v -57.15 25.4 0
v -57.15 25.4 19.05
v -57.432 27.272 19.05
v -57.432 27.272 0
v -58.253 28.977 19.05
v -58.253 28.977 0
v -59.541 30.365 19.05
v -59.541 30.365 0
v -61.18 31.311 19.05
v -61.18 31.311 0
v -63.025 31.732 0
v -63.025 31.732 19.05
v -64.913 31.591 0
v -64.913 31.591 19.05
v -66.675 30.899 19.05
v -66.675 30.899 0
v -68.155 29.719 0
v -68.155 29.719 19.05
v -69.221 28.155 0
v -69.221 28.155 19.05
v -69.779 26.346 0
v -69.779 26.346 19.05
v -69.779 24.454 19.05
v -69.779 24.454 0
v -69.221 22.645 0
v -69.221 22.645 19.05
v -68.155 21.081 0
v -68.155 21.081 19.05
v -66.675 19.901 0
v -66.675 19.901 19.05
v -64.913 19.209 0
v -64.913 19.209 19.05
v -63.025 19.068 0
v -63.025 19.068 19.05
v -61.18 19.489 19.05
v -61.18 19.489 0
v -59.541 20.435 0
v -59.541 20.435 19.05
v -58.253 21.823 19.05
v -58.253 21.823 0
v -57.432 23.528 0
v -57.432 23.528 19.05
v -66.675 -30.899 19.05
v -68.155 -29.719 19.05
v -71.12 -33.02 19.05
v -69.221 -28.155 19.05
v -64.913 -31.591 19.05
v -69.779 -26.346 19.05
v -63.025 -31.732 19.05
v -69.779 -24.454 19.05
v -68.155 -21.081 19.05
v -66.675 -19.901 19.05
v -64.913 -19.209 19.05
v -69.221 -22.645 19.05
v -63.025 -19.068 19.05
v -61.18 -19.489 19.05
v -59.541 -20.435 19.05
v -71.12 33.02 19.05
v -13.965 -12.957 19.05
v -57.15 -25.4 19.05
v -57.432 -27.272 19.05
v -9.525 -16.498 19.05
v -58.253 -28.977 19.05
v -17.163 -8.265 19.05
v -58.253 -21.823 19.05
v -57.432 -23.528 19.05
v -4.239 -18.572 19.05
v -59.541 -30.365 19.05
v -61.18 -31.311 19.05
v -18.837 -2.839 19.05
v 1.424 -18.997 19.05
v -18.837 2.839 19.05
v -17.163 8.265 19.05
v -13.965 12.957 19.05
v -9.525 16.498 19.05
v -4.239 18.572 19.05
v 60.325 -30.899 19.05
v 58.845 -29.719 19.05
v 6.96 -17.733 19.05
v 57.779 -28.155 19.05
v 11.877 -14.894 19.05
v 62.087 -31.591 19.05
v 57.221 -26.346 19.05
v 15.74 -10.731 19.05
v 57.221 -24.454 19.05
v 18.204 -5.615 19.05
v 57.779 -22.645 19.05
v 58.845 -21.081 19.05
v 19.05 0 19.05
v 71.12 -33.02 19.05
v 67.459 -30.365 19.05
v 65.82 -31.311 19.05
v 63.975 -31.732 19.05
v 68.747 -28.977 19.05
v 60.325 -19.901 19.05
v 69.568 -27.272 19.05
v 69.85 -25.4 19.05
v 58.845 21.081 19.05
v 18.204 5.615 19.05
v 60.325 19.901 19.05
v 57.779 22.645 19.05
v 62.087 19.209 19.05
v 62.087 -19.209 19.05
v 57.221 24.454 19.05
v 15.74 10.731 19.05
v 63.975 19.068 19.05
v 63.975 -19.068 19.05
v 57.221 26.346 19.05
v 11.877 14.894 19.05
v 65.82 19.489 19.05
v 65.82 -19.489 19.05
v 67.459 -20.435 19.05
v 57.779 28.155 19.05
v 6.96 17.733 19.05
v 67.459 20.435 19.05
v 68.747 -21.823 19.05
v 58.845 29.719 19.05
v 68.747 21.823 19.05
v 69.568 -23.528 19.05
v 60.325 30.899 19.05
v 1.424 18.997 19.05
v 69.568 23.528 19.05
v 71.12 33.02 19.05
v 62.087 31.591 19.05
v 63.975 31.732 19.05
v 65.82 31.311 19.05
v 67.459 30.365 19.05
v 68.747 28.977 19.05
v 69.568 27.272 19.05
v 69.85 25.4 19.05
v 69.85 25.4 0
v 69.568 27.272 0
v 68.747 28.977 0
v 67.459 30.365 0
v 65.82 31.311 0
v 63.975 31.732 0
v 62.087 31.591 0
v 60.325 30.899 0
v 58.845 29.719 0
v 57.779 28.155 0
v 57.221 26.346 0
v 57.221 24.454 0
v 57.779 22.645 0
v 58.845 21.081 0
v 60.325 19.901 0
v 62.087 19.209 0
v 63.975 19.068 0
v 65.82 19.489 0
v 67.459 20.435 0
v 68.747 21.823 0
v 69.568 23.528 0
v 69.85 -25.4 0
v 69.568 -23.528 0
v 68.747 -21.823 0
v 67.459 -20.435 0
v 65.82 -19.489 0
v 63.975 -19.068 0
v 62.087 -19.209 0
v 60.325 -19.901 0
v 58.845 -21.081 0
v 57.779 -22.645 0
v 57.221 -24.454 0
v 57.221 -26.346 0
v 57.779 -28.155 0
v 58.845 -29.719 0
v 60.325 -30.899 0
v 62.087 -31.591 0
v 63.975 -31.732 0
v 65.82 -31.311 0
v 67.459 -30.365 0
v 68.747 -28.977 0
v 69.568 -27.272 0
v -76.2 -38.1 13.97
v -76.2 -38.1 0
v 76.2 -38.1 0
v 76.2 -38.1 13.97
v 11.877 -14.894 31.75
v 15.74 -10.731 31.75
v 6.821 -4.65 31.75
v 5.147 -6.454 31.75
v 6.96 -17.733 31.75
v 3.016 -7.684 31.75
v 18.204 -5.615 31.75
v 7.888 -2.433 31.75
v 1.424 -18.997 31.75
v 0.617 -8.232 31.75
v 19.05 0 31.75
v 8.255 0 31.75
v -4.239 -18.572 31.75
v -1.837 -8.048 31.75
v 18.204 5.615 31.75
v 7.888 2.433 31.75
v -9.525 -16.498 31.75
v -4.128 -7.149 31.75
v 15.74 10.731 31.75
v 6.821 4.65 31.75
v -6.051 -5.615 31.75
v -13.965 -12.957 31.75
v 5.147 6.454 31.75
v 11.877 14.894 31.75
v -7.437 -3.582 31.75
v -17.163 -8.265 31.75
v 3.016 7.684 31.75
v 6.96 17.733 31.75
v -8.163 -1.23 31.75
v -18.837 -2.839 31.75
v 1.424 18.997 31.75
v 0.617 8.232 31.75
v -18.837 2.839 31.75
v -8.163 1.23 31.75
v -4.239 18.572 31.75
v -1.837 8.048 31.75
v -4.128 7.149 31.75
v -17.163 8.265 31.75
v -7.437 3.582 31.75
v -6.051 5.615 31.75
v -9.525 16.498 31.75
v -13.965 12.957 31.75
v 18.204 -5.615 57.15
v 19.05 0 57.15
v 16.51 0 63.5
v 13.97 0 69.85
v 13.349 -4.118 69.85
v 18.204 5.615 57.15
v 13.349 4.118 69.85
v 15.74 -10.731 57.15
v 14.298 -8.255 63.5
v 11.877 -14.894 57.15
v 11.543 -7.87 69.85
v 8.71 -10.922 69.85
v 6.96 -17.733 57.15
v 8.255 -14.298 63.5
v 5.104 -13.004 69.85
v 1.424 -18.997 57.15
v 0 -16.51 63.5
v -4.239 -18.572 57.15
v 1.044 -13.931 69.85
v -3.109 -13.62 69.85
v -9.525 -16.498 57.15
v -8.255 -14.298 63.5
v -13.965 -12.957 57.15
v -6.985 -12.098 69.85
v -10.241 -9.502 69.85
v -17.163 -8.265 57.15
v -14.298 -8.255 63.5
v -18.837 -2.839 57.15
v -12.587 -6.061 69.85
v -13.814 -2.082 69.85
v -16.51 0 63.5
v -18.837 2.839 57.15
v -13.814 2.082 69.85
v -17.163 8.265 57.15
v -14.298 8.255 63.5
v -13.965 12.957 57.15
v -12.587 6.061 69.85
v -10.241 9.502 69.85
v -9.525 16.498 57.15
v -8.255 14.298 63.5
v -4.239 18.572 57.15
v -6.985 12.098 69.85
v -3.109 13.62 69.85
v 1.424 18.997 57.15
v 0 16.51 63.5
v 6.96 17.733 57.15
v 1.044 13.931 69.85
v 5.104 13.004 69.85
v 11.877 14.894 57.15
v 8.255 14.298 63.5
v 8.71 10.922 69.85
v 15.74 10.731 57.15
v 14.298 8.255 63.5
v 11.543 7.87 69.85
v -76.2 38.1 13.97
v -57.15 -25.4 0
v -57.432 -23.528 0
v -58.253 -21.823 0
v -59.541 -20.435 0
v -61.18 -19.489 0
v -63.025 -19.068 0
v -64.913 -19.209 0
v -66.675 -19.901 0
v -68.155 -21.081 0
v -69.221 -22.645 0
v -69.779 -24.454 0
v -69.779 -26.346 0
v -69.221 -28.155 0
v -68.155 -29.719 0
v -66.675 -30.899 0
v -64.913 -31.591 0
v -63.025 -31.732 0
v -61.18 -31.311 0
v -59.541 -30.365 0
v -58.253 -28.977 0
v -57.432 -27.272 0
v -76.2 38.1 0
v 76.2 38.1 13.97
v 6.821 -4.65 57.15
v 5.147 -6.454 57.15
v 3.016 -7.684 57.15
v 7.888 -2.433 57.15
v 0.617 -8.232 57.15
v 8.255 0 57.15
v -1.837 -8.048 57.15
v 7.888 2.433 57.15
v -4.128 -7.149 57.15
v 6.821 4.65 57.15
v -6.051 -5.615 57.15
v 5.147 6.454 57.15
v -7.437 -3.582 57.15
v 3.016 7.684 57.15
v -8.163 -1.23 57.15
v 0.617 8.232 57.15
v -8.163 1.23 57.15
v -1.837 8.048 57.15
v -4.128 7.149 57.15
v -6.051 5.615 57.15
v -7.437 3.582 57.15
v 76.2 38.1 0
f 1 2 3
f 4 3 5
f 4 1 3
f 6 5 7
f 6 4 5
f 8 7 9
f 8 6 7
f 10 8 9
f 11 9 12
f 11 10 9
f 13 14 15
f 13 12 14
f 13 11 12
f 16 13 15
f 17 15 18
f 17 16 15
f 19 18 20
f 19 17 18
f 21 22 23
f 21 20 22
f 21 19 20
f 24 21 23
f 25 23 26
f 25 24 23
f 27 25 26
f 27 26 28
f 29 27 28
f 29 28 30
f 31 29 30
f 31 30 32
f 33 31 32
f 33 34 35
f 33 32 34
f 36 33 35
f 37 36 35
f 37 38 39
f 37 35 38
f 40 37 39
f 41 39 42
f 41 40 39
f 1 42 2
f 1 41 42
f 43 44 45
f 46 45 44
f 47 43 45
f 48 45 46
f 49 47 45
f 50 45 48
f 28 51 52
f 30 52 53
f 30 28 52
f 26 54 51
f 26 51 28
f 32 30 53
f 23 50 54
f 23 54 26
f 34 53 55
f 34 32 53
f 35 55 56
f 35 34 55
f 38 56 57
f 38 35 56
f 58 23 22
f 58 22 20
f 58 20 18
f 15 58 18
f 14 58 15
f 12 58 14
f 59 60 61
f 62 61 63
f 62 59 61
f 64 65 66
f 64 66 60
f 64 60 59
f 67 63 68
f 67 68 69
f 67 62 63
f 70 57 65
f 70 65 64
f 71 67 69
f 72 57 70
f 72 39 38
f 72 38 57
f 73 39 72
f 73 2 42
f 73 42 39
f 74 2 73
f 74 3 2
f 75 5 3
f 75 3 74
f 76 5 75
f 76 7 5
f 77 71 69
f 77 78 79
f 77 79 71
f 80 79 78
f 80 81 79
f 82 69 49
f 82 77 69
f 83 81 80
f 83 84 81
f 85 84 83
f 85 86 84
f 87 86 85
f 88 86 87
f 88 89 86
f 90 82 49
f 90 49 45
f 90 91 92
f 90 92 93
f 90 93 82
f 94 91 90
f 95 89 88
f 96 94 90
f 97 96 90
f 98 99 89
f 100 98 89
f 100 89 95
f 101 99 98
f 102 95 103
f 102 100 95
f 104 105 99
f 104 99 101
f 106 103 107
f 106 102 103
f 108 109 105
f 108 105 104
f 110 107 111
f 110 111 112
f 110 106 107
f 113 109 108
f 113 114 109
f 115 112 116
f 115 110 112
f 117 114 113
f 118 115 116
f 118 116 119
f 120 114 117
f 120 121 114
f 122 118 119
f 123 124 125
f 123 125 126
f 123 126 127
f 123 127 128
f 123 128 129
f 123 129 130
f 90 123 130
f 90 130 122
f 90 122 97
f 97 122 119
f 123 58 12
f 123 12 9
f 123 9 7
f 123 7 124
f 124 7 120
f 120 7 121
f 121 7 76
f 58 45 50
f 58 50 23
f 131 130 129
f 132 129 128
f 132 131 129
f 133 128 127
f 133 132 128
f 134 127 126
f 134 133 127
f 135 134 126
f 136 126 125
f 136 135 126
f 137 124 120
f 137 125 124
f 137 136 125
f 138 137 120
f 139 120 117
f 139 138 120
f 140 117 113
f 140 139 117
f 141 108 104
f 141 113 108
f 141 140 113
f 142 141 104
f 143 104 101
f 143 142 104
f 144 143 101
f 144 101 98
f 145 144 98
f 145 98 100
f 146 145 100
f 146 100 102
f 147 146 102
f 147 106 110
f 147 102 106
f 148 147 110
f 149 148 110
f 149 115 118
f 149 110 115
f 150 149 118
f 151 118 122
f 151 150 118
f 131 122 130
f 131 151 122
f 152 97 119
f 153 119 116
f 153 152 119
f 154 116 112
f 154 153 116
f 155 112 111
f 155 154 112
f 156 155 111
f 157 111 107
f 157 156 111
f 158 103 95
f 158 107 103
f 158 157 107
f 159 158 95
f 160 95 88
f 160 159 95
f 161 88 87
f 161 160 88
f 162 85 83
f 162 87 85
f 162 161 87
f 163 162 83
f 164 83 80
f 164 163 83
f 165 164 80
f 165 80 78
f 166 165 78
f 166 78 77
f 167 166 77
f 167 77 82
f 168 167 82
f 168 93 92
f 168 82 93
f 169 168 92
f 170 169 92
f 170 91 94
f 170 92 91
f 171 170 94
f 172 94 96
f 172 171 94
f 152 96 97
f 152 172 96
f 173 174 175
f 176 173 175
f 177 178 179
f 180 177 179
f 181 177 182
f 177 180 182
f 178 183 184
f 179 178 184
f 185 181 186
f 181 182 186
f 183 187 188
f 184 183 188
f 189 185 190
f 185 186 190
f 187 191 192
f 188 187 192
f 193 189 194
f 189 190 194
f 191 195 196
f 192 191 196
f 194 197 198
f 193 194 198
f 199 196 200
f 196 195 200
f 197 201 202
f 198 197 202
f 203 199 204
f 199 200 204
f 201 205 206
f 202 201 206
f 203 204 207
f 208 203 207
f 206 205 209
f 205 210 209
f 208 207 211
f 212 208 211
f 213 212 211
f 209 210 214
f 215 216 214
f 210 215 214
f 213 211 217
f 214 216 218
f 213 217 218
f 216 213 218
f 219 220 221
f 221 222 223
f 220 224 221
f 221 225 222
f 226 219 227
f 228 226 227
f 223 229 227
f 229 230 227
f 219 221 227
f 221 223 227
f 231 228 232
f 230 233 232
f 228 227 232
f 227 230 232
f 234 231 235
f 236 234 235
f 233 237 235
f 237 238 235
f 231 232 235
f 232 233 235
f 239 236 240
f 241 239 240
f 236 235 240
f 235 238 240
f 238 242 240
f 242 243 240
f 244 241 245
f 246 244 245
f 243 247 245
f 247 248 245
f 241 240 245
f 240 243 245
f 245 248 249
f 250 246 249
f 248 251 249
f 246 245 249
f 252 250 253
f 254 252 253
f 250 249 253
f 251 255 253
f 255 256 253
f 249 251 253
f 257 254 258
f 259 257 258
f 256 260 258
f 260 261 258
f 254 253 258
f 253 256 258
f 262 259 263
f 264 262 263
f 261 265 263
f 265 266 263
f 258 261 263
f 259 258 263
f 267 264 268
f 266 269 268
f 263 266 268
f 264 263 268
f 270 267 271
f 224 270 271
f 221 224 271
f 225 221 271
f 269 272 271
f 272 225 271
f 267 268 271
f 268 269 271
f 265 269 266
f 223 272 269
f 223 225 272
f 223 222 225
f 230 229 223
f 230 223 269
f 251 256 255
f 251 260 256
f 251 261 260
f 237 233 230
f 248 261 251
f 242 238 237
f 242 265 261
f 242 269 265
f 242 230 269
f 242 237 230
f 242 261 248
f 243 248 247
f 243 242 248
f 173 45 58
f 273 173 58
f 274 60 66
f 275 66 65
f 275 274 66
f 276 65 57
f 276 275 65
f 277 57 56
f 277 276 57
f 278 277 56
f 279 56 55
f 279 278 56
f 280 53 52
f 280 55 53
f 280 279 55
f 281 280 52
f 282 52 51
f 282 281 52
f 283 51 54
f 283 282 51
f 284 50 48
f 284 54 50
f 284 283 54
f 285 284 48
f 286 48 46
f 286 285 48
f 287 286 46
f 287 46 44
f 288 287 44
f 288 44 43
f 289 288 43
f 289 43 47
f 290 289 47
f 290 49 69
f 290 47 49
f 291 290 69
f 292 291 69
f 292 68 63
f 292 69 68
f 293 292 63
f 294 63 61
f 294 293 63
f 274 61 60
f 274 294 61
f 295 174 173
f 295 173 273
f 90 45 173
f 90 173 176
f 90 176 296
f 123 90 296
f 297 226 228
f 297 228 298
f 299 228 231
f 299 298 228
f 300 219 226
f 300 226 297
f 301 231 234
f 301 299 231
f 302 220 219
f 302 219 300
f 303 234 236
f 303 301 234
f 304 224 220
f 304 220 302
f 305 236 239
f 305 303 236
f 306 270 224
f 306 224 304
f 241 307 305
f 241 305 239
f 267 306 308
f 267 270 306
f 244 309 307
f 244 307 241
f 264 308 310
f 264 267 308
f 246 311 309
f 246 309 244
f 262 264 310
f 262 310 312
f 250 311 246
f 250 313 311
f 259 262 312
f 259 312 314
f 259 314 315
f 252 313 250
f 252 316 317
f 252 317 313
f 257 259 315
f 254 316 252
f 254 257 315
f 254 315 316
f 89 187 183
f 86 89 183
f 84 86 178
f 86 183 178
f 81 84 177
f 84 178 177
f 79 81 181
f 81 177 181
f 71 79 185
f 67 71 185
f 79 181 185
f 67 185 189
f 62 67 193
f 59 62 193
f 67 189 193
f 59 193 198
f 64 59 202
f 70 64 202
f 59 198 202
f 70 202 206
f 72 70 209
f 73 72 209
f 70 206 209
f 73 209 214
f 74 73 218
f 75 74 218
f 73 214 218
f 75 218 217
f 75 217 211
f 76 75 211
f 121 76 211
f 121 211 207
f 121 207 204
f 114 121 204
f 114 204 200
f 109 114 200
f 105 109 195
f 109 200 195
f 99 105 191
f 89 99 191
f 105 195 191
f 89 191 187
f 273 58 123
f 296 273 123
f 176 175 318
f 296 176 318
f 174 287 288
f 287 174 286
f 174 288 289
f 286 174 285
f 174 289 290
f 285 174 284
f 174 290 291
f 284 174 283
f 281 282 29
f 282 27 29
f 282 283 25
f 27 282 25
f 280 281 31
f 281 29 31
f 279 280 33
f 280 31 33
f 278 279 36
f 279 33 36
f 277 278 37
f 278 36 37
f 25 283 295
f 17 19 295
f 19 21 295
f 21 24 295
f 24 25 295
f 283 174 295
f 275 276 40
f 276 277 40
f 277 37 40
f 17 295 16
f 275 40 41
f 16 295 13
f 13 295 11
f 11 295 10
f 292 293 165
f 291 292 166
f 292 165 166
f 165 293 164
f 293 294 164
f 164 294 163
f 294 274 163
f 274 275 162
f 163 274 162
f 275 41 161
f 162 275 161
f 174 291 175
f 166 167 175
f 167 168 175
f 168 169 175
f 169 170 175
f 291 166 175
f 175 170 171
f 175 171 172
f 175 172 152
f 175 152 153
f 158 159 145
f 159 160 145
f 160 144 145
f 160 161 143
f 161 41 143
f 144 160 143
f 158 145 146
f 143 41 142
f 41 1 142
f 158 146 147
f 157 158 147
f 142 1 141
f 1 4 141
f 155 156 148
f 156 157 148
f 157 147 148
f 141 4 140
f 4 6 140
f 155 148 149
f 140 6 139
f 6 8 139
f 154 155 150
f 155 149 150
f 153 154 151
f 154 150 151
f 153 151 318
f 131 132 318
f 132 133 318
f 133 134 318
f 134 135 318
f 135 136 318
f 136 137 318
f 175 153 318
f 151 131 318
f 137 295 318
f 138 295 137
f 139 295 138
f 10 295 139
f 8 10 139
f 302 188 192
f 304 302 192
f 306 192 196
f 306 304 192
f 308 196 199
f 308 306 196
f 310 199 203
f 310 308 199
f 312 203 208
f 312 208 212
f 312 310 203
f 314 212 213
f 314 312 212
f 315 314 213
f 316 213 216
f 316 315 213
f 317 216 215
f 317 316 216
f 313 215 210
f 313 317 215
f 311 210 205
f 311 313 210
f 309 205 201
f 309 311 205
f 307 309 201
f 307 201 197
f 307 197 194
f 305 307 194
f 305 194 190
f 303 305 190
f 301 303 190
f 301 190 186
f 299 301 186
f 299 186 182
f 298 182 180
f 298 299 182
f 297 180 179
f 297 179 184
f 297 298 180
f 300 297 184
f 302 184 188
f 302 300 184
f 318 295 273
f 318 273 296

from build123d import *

# Parameters (mm, degrees)
F0_W     = 152.4
F0_H     = 76.2
F1_DEPTH = 19.05
F2_R     = 6.35
F3_DEPTH = 19.051
F4_W     = 19.05
F4_H     = 50.8
F6_SIZE  = 5.08
F7_W     = 10.795
F7_H     = 25.4
F9_SIZE2 = 5.07999
F9_SIZE  = 12.69999


# Not quite as in the source:
# - a fillet or chamfer is up to 0.001 mm smaller than in the source, because OpenCascade refuses the exact size


with BuildPart() as f1:
    # F0 (on Top) → F1 (new body)
    with BuildSketch(Plane.XY):
        Rectangle(F0_W, F0_H)
    extrude(amount=F1_DEPTH)

    # F2 (on Top) → F3 (cut, through all)
    with BuildSketch(Plane.XY):
        with Locations((-63.5, 25.4)):
            Circle(F2_R)
        with Locations((63.5, -25.4)):
            Circle(F2_R)
        with Locations((63.5, 25.4)):
            Circle(F2_R)
        with Locations((-63.5, -25.4)):
            Circle(F2_R)
    extrude(amount=F3_DEPTH, mode=Mode.SUBTRACT)

    # F4 (on Front) → F5 (revolve)
    with BuildSketch(Plane.XZ):
        with Locations((9.525, 44.45)):
            Rectangle(F4_W, F4_H)
    revolve(axis=Axis((0, 0, 44.45), (0, 0, -1)))

    # F6
    f6_edges = [f1.edges().sort_by_distance(p)[0] for p in [
        (0, -38.1, 19.05),
        (-76.2, 0, 19.05),
        (0, 38.1, 19.05),
        (76.2, 0, 19.05),
    ]]
    chamfer(f6_edges, length=F6_SIZE)

    # F7 (on Front) → F8 (revolve, cut)
    with BuildSketch(Plane.XZ):
        with Locations((13.6525, 44.45)):
            Rectangle(F7_W, F7_H)
    revolve(axis=Axis((0, 0, 19.05), (0, 0, 1)), mode=Mode.SUBTRACT)

    # F9 (size 12.7 and 5.08 in the source; OpenCascade refuses exactly that, so slightly less here)
    f9_edges = [f1.edges().sort_by_distance(p)[0] for p in [
        (-19.05, 0, 69.85),
    ]]
    f9_side = f1.faces().sort_by_distance((-19.05, 0, 63.5))[0]
    chamfer(f9_edges, length=F9_SIZE, length2=F9_SIZE2, reference=f9_side)


solid = f1.part
